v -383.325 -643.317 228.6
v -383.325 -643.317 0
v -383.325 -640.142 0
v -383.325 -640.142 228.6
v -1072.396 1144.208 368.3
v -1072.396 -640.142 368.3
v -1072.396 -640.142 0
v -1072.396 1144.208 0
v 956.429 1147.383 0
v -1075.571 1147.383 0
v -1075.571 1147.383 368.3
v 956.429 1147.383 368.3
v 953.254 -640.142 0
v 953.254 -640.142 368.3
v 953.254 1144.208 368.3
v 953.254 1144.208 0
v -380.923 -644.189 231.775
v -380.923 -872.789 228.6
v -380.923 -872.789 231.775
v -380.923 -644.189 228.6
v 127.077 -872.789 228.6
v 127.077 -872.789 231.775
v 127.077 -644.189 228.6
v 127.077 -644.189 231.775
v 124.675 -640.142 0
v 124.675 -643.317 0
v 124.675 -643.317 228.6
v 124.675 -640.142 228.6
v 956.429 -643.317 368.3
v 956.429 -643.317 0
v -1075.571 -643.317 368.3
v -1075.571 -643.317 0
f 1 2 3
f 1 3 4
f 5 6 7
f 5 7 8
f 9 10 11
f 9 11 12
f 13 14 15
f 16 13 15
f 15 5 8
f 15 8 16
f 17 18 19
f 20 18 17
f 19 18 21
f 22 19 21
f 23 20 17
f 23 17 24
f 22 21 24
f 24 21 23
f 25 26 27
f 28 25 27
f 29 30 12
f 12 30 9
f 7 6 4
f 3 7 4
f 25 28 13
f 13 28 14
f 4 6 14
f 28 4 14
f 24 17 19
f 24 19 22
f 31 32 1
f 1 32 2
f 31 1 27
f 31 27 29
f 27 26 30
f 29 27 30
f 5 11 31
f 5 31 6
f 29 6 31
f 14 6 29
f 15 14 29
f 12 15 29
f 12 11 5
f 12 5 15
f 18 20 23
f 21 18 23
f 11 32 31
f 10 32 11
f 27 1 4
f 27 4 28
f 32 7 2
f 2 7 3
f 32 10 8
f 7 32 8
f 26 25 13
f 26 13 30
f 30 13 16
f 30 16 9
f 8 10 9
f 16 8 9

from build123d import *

# Parameters (mm, degrees)
F0_W     = 2032
F0_H     = 1790.7
F1_DEPTH = 368.3
F2_W     = 2025.65
F2_H     = 1784.35
F3_DEPTH = 368.3
F4_W     = 508
F4_H     = 228.6
F5_DEPTH = 25.4
F7_W     = 508
F7_H     = 228.6
F8_DEPTH = 3.175


with BuildPart() as f1:
    # F0 (on Top) → F1 (new body)
    with BuildSketch(Plane.XY):
        with Locations((-59.571021, 252.033191)):
            Rectangle(F0_W, F0_H)
    extrude(amount=F1_DEPTH)

    # F2 (on face) → F3 (cut)
    with BuildSketch(Plane.XY.offset(368.3)):
        with Locations((-59.571021, 252.033191)):
            Rectangle(F2_W, F2_H)
    extrude(amount=-F3_DEPTH, mode=Mode.SUBTRACT)

    # F4 (on face) → F5 (cut)
    with BuildSketch(Plane.XZ.offset(643.316809)):
        with Locations((-129.324785, 114.3)):
            Rectangle(F4_W, F4_H)
    extrude(amount=-F5_DEPTH, mode=Mode.SUBTRACT)


with BuildPart() as f8:
    # F7 (on offset) → F8 (new body)
    with BuildSketch(Plane.XY.offset(228.6)):
        with Locations((-126.923097, -758.489281)):
            Rectangle(F7_W, F7_H)
    extrude(amount=F8_DEPTH)


solid = Compound([f1.part, f8.part])
